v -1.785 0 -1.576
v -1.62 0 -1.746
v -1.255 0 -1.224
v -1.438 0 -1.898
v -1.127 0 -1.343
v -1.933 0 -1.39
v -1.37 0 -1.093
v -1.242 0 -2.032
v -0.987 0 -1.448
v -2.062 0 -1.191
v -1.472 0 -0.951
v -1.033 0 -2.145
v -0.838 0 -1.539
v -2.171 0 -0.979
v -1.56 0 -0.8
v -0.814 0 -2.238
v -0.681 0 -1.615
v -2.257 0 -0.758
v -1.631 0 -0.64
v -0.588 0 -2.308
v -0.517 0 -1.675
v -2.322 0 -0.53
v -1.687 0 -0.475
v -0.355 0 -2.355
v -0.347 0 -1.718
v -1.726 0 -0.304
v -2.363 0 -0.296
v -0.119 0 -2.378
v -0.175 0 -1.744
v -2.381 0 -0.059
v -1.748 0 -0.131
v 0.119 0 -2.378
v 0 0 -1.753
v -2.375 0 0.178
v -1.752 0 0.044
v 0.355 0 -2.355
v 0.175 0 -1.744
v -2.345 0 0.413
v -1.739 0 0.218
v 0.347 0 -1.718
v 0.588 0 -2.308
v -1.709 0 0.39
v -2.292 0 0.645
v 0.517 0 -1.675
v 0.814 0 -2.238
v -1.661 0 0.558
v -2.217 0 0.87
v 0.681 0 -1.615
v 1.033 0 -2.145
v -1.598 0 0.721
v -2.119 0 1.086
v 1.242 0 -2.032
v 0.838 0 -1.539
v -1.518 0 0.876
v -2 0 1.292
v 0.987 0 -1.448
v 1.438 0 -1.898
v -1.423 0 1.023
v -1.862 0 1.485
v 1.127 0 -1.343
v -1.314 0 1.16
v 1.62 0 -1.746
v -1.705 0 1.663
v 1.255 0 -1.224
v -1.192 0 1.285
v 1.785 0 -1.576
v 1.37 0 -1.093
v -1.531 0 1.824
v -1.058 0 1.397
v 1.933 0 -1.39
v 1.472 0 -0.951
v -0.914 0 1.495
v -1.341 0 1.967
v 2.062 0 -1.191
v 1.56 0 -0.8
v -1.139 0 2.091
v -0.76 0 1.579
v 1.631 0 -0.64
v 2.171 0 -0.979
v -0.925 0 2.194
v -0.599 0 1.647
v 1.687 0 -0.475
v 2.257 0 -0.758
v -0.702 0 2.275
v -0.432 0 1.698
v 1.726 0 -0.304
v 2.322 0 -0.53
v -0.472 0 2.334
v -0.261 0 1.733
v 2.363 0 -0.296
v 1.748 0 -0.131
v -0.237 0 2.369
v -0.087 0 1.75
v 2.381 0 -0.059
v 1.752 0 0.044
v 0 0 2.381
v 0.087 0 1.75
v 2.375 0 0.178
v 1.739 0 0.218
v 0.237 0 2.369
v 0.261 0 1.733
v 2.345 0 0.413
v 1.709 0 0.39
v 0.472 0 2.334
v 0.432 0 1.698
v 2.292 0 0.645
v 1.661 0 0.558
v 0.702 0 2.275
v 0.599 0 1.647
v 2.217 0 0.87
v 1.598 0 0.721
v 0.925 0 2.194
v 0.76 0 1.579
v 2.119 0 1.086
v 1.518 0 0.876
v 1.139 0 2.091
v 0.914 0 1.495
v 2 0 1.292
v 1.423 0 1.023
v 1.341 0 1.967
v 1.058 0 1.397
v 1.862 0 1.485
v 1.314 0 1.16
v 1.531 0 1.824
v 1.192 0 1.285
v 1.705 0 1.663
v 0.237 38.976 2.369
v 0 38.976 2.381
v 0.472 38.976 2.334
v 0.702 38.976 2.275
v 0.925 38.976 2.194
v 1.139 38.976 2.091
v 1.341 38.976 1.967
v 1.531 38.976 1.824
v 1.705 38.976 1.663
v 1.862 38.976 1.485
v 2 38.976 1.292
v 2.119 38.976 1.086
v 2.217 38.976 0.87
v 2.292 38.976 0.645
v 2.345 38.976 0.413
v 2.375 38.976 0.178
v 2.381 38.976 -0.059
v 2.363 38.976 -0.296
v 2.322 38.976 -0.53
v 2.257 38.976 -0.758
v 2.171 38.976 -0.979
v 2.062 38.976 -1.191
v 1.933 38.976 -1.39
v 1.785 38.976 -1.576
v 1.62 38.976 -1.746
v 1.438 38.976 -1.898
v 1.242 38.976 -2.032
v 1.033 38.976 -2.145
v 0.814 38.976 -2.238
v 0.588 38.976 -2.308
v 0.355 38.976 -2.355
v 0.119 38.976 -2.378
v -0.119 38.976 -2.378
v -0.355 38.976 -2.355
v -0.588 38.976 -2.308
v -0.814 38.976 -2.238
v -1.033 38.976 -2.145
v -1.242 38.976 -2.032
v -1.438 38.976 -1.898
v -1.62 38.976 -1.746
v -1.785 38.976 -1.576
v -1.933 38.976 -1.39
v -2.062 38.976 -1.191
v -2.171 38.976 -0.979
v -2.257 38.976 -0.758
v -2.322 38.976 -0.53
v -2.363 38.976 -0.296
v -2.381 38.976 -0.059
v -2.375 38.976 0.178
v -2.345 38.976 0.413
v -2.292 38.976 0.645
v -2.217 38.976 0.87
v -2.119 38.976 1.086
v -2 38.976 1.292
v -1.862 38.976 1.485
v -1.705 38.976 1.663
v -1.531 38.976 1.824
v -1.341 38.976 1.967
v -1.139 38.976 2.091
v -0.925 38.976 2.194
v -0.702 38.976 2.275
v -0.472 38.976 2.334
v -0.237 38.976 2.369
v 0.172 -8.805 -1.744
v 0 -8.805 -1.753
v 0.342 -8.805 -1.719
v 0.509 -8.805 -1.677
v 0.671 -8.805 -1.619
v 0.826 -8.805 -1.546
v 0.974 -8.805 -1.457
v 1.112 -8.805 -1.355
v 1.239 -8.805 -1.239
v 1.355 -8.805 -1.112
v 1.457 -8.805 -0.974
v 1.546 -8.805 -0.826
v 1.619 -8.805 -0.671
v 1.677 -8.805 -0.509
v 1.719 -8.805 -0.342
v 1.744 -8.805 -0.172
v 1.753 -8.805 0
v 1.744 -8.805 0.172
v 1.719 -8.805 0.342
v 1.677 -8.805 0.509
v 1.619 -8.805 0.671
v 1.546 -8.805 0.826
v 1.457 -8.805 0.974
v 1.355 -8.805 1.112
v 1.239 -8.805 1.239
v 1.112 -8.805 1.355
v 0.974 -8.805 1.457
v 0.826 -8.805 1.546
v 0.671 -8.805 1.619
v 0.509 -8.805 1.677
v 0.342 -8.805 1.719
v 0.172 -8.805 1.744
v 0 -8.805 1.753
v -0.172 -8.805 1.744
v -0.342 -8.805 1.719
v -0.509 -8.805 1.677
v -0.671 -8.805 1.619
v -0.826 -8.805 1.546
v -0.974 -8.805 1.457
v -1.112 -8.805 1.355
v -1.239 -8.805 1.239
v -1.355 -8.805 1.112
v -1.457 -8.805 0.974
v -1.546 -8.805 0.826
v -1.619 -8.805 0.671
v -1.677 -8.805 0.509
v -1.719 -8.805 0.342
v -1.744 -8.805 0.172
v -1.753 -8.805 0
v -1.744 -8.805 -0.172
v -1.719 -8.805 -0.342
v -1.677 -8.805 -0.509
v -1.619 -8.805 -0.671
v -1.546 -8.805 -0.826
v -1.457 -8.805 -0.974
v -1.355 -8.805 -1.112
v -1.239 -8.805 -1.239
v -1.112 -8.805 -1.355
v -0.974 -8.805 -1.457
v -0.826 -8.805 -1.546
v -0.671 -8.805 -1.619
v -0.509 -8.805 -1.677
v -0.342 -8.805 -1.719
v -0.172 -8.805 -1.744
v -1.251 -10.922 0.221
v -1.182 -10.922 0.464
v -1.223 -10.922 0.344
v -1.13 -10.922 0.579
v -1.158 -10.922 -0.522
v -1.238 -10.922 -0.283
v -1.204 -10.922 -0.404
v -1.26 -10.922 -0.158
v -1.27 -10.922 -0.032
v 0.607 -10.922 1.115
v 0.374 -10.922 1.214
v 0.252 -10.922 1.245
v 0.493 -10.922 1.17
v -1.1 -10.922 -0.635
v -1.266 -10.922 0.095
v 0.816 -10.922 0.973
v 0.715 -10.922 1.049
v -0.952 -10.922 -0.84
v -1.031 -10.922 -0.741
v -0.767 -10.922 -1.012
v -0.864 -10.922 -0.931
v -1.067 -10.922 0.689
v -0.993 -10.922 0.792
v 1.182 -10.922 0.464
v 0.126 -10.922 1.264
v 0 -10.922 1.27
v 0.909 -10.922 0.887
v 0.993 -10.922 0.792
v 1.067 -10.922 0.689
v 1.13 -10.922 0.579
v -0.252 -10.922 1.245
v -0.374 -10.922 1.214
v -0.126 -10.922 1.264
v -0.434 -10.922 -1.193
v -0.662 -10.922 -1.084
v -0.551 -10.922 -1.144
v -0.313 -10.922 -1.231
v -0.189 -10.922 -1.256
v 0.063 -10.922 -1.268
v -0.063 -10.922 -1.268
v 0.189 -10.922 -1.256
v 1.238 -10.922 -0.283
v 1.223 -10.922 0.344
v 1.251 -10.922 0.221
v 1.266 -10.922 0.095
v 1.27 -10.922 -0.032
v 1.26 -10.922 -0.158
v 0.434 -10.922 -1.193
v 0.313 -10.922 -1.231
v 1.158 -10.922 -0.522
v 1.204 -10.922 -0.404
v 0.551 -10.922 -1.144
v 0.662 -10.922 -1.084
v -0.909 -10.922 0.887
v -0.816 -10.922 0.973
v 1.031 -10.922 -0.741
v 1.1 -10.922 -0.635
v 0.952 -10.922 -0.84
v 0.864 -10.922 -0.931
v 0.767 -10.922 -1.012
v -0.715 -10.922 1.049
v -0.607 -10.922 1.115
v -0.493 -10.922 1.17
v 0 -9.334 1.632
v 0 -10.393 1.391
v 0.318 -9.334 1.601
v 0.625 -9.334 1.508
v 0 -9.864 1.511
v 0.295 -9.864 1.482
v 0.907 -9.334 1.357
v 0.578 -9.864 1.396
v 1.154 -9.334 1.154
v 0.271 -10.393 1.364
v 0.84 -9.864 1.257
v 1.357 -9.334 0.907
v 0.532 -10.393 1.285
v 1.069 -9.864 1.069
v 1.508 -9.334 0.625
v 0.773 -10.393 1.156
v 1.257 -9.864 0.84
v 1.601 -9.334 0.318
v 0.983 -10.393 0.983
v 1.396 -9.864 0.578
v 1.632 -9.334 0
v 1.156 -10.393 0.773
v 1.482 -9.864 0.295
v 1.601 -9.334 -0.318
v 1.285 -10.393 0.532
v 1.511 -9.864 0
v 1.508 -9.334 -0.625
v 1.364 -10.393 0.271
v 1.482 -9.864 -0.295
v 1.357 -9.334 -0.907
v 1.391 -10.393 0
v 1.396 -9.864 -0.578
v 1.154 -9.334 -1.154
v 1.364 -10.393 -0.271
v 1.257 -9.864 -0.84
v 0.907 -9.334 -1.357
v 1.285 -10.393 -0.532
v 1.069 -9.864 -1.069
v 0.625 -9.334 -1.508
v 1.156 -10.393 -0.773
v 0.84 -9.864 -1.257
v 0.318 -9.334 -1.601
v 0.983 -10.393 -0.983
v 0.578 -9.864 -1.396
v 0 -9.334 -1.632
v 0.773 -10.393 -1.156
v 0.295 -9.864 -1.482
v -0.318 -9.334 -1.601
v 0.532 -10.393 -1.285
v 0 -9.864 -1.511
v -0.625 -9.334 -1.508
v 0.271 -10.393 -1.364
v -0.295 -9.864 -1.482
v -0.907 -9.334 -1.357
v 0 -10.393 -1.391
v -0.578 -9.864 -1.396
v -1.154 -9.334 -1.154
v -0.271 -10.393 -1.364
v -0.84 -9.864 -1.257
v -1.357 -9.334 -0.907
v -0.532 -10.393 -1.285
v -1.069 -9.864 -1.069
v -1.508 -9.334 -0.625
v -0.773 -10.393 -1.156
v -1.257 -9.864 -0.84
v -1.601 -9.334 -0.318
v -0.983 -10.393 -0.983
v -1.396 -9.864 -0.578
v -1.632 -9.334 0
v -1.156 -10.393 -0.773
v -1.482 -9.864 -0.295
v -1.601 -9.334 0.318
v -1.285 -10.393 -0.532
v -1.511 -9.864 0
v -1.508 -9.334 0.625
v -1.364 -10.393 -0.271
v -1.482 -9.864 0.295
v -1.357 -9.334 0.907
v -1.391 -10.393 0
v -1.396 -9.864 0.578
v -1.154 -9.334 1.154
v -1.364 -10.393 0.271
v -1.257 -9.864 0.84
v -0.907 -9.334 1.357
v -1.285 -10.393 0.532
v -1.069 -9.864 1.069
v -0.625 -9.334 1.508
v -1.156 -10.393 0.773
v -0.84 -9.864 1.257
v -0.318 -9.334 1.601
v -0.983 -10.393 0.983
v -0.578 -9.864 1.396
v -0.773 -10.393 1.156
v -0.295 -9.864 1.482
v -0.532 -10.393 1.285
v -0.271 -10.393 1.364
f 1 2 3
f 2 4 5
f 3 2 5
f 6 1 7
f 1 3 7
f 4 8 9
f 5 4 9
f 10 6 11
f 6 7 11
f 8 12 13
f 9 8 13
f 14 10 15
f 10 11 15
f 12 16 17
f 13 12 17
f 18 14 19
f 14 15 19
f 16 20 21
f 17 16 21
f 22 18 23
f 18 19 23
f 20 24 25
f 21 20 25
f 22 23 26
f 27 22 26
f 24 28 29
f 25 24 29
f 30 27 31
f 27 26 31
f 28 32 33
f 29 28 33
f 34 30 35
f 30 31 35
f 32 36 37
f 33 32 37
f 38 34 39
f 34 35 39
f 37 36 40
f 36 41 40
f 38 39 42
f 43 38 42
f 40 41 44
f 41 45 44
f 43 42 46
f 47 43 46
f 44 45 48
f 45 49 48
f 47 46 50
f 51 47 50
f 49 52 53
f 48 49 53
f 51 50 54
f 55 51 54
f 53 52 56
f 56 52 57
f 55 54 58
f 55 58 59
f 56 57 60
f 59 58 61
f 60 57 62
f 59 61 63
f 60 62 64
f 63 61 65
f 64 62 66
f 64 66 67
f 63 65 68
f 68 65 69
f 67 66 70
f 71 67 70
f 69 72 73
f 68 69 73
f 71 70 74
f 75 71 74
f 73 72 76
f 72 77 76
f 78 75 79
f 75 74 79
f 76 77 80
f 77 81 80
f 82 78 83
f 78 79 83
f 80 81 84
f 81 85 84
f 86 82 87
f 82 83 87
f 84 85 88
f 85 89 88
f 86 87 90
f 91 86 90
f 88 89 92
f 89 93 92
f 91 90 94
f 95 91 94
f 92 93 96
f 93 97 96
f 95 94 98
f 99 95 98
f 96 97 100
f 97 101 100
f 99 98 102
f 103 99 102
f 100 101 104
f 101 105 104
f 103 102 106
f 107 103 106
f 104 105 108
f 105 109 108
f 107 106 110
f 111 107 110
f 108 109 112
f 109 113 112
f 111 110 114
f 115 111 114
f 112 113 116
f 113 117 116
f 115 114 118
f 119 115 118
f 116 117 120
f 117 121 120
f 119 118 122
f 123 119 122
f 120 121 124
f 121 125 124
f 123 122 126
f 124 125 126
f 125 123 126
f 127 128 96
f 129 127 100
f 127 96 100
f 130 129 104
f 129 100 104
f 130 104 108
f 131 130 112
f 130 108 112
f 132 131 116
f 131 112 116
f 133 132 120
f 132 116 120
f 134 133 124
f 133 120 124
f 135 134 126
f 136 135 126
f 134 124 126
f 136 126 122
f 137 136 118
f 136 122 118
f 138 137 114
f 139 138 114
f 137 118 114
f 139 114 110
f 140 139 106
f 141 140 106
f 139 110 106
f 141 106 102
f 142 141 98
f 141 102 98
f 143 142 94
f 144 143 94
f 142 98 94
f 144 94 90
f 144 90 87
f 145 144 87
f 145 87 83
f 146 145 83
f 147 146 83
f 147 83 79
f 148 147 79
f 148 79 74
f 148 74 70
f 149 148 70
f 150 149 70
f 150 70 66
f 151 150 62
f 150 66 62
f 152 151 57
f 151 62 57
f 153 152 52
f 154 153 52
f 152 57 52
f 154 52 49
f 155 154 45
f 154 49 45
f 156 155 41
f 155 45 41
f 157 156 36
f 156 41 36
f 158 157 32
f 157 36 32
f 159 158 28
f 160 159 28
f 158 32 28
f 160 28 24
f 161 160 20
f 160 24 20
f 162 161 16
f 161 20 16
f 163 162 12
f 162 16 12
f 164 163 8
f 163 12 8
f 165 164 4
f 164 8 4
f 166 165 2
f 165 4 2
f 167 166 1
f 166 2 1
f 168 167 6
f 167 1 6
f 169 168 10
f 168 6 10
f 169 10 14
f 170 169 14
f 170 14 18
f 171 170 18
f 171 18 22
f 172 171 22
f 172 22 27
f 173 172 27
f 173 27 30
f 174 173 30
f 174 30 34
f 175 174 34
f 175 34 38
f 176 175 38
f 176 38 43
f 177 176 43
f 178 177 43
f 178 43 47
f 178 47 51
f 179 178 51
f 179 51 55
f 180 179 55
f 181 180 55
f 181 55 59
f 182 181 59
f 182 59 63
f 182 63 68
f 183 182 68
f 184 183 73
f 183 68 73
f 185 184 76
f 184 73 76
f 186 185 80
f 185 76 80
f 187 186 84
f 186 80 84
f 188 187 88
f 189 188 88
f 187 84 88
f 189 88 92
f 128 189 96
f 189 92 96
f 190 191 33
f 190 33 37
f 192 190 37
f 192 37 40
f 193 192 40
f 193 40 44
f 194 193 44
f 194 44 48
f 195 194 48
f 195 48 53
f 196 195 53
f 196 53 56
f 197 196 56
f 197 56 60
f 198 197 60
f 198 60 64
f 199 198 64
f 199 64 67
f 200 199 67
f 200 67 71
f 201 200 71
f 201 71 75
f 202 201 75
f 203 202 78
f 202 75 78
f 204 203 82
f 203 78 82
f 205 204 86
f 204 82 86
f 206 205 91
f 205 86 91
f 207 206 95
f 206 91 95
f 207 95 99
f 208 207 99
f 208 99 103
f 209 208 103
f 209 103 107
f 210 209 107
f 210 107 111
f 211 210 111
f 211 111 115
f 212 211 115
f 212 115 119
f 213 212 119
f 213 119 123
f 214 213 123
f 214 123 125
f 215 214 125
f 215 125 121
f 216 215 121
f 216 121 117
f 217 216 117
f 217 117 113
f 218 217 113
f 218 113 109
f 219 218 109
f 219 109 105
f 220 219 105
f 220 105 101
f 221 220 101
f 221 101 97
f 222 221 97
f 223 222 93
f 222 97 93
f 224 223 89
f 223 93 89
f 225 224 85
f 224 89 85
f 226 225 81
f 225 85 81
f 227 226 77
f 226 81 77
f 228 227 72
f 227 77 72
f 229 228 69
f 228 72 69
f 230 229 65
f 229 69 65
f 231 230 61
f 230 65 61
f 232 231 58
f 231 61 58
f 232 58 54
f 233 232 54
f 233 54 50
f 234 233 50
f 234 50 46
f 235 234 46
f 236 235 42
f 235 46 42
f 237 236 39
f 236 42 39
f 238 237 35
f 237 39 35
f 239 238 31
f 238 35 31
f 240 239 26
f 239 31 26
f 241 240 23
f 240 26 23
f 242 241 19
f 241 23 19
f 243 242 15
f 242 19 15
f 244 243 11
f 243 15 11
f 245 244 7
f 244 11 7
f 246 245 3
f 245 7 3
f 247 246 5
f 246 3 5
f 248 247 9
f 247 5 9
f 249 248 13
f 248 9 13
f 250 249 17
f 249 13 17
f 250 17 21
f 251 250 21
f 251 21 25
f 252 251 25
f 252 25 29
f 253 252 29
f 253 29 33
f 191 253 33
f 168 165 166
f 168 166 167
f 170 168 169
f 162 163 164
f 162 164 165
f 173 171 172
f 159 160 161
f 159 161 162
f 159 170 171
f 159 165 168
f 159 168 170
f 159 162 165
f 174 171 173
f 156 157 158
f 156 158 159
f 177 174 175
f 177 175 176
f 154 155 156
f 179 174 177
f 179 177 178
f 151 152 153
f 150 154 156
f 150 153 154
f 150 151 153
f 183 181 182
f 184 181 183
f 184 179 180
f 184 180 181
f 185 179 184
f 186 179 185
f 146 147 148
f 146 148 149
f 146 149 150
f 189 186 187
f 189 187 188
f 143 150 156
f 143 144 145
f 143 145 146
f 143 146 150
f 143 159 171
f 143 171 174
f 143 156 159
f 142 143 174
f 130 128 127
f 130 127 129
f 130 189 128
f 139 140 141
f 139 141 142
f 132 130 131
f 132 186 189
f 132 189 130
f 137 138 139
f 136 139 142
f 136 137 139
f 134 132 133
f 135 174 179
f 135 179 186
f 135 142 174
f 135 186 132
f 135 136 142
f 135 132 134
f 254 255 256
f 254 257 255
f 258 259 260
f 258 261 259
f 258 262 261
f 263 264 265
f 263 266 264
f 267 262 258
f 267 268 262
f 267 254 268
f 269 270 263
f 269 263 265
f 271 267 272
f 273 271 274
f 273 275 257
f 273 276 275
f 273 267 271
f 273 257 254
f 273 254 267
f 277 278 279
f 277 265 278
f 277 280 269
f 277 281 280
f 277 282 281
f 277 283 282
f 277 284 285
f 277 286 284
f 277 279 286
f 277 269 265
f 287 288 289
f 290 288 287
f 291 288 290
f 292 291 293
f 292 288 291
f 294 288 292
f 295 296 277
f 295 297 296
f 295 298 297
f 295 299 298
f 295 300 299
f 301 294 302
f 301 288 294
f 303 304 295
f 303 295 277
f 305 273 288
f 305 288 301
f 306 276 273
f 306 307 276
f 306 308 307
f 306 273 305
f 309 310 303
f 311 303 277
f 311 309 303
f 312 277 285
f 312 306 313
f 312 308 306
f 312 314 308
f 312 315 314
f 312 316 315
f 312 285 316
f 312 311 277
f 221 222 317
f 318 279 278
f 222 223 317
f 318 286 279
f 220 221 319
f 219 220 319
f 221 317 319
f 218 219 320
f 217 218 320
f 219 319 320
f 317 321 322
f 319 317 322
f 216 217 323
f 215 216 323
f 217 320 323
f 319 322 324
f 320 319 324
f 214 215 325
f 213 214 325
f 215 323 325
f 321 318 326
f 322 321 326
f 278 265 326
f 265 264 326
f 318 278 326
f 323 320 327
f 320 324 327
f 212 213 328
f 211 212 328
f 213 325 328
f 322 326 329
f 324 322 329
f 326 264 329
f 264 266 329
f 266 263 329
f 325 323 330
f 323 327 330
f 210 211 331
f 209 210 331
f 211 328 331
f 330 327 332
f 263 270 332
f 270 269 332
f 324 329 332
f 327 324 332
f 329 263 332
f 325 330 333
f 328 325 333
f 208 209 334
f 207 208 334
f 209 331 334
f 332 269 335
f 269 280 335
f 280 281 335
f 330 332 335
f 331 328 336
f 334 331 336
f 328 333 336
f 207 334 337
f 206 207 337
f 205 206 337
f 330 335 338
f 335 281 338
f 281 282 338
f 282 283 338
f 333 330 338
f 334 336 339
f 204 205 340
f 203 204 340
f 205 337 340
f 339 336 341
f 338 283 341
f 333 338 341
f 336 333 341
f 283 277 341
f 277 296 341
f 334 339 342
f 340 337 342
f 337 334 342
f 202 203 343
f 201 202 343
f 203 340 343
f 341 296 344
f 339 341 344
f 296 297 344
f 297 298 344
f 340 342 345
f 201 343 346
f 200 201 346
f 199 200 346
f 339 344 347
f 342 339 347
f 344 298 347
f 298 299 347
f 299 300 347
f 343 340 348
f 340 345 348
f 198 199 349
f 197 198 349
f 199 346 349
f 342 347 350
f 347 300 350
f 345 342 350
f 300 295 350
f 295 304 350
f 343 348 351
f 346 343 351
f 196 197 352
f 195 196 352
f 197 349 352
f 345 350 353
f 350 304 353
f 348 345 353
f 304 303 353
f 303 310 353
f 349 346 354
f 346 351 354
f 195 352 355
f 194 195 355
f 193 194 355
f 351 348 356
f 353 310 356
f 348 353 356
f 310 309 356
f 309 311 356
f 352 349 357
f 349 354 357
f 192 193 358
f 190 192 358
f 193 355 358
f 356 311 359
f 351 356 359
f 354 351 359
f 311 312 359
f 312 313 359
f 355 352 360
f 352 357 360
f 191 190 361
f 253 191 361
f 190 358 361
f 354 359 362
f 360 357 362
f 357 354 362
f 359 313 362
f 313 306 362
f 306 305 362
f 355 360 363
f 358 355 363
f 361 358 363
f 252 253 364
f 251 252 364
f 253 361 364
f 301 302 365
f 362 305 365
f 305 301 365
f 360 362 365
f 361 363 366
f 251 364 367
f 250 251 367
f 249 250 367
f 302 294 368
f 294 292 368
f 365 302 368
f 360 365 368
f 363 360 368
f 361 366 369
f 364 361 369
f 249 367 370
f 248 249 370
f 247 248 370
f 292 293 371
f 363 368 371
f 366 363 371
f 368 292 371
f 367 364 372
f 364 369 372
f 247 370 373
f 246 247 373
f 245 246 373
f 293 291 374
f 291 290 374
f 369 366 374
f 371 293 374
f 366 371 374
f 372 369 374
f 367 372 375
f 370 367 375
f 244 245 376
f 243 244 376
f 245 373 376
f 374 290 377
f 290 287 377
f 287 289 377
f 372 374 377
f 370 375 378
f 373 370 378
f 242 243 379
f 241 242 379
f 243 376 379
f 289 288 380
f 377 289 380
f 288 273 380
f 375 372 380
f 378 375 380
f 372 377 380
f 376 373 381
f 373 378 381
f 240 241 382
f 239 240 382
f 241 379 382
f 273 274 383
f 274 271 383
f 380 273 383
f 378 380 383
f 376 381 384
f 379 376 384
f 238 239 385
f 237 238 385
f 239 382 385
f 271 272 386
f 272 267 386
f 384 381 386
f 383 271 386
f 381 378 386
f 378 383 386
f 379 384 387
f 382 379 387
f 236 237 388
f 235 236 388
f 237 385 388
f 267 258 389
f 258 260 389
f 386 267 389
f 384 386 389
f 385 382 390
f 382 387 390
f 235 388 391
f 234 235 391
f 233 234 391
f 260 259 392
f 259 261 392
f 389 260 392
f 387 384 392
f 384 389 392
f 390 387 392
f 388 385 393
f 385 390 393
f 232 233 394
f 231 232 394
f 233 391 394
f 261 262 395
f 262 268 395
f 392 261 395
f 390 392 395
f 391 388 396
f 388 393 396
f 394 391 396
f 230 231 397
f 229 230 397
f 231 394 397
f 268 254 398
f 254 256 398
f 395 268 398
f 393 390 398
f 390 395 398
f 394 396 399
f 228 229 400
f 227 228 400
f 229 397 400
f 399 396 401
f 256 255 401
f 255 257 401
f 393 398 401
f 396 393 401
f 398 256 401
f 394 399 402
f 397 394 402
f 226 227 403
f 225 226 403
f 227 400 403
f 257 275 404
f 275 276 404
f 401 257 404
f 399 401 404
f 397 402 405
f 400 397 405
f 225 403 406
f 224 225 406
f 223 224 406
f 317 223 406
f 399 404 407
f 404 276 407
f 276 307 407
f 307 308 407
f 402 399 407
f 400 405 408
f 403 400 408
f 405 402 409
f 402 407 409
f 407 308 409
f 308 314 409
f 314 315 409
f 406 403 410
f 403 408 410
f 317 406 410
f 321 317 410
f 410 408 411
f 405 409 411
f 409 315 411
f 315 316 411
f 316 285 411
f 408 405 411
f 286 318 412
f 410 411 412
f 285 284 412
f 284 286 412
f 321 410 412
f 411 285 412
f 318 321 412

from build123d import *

# Parameters (mm, degrees)
SKETCH1_R           = 2.38125
BOSS_EXTRUDE1_DEPTH = 38.9763
SKETCH2_R           = 1.7526
BOSS_EXTRUDE2_DEPTH = 10.922


with BuildPart() as part:
    # Sketch1 → Boss-Extrude1 (new body)
    with BuildSketch(Plane(origin=(0, 0, 0), x_dir=(1, 0, 0), z_dir=(0, 1, 0))):
        with Locations(Location((0, 0, 0), (0, 0, 270))):
            Circle(SKETCH1_R)
    extrude(amount=BOSS_EXTRUDE1_DEPTH)

    # Sketch2 → Boss-Extrude2 (add)
    with BuildSketch(Plane.XZ):
        with Locations(Location((0, 0, 0), (0, 0, 270))):
            Circle(SKETCH2_R)
    extrude(amount=BOSS_EXTRUDE2_DEPTH)

    # Sketch3 → Cut-Revolve1 (revolve, cut)
    with BuildSketch(Plane(origin=(0, 0, 0), x_dir=(0, 0, -1), z_dir=(1, 0, 0)), mode=Mode.PRIVATE) as cut_revolve1_sk:
        Polygon((1.7526, -8.805333333), (1.27, -10.922), (1.7526, -10.922), align=None)
    revolve(cut_revolve1_sk.sketch.rotate(Axis((0, -10.922, 0), (0, 1, 0)), 180), axis=Axis((0, -10.922, 0), (0, 1, 0)), mode=Mode.SUBTRACT)


solid = part.part
